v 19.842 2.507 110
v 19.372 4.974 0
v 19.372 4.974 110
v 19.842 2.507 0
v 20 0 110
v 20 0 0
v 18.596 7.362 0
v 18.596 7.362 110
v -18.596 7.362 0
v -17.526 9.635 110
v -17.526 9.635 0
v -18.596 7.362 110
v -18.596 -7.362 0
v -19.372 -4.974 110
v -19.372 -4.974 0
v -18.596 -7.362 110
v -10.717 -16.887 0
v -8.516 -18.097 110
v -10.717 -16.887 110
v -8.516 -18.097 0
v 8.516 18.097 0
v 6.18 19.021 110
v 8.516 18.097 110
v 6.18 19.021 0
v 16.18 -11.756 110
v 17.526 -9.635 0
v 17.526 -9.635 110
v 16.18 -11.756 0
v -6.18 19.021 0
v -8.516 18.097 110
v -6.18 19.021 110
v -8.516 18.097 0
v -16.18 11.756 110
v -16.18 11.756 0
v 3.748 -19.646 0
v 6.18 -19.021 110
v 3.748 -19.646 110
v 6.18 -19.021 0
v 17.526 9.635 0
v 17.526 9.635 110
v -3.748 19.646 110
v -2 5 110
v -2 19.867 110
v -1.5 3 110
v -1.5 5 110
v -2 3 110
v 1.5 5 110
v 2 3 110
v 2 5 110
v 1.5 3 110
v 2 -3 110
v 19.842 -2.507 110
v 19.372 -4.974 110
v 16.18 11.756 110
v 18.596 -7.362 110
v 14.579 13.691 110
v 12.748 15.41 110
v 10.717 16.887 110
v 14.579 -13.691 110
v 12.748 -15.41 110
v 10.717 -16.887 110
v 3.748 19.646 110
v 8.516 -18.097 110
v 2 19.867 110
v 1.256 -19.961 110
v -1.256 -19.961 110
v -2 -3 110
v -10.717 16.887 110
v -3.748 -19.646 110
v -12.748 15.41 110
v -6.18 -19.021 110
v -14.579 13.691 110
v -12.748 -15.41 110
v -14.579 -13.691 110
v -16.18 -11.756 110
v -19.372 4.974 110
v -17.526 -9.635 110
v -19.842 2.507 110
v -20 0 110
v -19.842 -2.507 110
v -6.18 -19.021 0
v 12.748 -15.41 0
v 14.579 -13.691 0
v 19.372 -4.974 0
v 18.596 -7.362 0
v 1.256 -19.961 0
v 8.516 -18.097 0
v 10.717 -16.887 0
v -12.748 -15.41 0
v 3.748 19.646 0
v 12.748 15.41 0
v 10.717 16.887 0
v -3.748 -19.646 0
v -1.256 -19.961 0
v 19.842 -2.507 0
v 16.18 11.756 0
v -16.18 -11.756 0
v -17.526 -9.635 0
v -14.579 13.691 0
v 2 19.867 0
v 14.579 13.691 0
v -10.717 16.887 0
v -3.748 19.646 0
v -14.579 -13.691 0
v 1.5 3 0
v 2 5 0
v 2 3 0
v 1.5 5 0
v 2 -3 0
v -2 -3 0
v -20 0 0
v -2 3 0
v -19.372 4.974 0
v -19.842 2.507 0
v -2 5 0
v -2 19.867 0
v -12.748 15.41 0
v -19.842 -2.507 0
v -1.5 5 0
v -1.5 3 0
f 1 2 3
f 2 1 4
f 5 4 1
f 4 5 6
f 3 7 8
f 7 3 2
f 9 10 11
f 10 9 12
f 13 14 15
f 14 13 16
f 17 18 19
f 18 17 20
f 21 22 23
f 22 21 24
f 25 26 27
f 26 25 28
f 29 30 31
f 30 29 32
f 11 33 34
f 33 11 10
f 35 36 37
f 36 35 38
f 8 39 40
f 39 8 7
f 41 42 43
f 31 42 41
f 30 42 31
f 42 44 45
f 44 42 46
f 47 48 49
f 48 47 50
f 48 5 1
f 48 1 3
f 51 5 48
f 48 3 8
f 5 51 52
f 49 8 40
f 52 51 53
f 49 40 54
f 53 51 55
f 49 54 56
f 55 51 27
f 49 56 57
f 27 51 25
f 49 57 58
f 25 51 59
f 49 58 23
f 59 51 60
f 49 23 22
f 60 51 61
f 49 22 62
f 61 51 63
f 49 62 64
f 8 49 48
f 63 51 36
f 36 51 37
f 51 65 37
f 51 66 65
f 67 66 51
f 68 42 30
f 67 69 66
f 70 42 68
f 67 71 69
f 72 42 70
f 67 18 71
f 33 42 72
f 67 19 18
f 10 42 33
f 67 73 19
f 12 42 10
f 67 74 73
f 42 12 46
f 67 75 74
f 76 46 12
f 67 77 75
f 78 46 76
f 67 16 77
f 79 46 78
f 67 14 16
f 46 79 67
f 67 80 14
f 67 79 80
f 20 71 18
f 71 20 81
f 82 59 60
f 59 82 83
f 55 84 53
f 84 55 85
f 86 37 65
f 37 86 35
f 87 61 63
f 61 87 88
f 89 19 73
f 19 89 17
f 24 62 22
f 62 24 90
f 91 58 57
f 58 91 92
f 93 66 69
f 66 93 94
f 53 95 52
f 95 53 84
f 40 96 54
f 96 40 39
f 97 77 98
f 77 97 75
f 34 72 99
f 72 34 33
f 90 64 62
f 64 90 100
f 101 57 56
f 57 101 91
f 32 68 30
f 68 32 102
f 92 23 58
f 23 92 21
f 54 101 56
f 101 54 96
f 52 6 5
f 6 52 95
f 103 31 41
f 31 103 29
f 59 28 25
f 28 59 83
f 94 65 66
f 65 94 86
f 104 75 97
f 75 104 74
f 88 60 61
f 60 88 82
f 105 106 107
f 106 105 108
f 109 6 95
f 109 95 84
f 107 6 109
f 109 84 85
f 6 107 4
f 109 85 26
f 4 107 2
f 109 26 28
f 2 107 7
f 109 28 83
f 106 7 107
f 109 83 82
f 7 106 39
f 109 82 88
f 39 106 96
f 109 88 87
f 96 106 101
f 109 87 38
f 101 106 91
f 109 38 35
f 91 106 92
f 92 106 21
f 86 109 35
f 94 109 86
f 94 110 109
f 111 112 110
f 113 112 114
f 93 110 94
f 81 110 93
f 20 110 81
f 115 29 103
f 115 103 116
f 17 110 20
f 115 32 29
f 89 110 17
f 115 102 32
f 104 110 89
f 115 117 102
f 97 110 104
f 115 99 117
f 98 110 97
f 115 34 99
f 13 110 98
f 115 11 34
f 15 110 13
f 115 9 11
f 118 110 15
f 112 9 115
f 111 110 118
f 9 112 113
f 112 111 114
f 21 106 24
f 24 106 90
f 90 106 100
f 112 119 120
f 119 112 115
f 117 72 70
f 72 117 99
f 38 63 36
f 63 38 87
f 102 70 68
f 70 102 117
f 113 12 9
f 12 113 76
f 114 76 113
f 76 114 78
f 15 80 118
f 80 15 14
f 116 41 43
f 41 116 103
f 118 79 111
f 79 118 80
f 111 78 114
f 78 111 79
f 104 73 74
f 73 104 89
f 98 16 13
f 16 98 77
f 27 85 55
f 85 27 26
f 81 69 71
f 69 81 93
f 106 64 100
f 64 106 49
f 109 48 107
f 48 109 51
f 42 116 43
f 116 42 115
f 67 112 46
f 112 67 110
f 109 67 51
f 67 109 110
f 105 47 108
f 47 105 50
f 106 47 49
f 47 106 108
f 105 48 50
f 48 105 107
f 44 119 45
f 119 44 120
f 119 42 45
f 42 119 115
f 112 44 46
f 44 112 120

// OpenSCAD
// Model for a handle to more easily grab and use a physical therapy rubber band

$fn=50;

difference() {
    cylinder(h=110,d=40);
    translate([-2,-3,-5]) cube([4, 30, 120]);
}
translate([1.5, 3, 0]) cube([1,2,110]);
translate([-2.5, 3, 0]) cube([1,2,110]);
